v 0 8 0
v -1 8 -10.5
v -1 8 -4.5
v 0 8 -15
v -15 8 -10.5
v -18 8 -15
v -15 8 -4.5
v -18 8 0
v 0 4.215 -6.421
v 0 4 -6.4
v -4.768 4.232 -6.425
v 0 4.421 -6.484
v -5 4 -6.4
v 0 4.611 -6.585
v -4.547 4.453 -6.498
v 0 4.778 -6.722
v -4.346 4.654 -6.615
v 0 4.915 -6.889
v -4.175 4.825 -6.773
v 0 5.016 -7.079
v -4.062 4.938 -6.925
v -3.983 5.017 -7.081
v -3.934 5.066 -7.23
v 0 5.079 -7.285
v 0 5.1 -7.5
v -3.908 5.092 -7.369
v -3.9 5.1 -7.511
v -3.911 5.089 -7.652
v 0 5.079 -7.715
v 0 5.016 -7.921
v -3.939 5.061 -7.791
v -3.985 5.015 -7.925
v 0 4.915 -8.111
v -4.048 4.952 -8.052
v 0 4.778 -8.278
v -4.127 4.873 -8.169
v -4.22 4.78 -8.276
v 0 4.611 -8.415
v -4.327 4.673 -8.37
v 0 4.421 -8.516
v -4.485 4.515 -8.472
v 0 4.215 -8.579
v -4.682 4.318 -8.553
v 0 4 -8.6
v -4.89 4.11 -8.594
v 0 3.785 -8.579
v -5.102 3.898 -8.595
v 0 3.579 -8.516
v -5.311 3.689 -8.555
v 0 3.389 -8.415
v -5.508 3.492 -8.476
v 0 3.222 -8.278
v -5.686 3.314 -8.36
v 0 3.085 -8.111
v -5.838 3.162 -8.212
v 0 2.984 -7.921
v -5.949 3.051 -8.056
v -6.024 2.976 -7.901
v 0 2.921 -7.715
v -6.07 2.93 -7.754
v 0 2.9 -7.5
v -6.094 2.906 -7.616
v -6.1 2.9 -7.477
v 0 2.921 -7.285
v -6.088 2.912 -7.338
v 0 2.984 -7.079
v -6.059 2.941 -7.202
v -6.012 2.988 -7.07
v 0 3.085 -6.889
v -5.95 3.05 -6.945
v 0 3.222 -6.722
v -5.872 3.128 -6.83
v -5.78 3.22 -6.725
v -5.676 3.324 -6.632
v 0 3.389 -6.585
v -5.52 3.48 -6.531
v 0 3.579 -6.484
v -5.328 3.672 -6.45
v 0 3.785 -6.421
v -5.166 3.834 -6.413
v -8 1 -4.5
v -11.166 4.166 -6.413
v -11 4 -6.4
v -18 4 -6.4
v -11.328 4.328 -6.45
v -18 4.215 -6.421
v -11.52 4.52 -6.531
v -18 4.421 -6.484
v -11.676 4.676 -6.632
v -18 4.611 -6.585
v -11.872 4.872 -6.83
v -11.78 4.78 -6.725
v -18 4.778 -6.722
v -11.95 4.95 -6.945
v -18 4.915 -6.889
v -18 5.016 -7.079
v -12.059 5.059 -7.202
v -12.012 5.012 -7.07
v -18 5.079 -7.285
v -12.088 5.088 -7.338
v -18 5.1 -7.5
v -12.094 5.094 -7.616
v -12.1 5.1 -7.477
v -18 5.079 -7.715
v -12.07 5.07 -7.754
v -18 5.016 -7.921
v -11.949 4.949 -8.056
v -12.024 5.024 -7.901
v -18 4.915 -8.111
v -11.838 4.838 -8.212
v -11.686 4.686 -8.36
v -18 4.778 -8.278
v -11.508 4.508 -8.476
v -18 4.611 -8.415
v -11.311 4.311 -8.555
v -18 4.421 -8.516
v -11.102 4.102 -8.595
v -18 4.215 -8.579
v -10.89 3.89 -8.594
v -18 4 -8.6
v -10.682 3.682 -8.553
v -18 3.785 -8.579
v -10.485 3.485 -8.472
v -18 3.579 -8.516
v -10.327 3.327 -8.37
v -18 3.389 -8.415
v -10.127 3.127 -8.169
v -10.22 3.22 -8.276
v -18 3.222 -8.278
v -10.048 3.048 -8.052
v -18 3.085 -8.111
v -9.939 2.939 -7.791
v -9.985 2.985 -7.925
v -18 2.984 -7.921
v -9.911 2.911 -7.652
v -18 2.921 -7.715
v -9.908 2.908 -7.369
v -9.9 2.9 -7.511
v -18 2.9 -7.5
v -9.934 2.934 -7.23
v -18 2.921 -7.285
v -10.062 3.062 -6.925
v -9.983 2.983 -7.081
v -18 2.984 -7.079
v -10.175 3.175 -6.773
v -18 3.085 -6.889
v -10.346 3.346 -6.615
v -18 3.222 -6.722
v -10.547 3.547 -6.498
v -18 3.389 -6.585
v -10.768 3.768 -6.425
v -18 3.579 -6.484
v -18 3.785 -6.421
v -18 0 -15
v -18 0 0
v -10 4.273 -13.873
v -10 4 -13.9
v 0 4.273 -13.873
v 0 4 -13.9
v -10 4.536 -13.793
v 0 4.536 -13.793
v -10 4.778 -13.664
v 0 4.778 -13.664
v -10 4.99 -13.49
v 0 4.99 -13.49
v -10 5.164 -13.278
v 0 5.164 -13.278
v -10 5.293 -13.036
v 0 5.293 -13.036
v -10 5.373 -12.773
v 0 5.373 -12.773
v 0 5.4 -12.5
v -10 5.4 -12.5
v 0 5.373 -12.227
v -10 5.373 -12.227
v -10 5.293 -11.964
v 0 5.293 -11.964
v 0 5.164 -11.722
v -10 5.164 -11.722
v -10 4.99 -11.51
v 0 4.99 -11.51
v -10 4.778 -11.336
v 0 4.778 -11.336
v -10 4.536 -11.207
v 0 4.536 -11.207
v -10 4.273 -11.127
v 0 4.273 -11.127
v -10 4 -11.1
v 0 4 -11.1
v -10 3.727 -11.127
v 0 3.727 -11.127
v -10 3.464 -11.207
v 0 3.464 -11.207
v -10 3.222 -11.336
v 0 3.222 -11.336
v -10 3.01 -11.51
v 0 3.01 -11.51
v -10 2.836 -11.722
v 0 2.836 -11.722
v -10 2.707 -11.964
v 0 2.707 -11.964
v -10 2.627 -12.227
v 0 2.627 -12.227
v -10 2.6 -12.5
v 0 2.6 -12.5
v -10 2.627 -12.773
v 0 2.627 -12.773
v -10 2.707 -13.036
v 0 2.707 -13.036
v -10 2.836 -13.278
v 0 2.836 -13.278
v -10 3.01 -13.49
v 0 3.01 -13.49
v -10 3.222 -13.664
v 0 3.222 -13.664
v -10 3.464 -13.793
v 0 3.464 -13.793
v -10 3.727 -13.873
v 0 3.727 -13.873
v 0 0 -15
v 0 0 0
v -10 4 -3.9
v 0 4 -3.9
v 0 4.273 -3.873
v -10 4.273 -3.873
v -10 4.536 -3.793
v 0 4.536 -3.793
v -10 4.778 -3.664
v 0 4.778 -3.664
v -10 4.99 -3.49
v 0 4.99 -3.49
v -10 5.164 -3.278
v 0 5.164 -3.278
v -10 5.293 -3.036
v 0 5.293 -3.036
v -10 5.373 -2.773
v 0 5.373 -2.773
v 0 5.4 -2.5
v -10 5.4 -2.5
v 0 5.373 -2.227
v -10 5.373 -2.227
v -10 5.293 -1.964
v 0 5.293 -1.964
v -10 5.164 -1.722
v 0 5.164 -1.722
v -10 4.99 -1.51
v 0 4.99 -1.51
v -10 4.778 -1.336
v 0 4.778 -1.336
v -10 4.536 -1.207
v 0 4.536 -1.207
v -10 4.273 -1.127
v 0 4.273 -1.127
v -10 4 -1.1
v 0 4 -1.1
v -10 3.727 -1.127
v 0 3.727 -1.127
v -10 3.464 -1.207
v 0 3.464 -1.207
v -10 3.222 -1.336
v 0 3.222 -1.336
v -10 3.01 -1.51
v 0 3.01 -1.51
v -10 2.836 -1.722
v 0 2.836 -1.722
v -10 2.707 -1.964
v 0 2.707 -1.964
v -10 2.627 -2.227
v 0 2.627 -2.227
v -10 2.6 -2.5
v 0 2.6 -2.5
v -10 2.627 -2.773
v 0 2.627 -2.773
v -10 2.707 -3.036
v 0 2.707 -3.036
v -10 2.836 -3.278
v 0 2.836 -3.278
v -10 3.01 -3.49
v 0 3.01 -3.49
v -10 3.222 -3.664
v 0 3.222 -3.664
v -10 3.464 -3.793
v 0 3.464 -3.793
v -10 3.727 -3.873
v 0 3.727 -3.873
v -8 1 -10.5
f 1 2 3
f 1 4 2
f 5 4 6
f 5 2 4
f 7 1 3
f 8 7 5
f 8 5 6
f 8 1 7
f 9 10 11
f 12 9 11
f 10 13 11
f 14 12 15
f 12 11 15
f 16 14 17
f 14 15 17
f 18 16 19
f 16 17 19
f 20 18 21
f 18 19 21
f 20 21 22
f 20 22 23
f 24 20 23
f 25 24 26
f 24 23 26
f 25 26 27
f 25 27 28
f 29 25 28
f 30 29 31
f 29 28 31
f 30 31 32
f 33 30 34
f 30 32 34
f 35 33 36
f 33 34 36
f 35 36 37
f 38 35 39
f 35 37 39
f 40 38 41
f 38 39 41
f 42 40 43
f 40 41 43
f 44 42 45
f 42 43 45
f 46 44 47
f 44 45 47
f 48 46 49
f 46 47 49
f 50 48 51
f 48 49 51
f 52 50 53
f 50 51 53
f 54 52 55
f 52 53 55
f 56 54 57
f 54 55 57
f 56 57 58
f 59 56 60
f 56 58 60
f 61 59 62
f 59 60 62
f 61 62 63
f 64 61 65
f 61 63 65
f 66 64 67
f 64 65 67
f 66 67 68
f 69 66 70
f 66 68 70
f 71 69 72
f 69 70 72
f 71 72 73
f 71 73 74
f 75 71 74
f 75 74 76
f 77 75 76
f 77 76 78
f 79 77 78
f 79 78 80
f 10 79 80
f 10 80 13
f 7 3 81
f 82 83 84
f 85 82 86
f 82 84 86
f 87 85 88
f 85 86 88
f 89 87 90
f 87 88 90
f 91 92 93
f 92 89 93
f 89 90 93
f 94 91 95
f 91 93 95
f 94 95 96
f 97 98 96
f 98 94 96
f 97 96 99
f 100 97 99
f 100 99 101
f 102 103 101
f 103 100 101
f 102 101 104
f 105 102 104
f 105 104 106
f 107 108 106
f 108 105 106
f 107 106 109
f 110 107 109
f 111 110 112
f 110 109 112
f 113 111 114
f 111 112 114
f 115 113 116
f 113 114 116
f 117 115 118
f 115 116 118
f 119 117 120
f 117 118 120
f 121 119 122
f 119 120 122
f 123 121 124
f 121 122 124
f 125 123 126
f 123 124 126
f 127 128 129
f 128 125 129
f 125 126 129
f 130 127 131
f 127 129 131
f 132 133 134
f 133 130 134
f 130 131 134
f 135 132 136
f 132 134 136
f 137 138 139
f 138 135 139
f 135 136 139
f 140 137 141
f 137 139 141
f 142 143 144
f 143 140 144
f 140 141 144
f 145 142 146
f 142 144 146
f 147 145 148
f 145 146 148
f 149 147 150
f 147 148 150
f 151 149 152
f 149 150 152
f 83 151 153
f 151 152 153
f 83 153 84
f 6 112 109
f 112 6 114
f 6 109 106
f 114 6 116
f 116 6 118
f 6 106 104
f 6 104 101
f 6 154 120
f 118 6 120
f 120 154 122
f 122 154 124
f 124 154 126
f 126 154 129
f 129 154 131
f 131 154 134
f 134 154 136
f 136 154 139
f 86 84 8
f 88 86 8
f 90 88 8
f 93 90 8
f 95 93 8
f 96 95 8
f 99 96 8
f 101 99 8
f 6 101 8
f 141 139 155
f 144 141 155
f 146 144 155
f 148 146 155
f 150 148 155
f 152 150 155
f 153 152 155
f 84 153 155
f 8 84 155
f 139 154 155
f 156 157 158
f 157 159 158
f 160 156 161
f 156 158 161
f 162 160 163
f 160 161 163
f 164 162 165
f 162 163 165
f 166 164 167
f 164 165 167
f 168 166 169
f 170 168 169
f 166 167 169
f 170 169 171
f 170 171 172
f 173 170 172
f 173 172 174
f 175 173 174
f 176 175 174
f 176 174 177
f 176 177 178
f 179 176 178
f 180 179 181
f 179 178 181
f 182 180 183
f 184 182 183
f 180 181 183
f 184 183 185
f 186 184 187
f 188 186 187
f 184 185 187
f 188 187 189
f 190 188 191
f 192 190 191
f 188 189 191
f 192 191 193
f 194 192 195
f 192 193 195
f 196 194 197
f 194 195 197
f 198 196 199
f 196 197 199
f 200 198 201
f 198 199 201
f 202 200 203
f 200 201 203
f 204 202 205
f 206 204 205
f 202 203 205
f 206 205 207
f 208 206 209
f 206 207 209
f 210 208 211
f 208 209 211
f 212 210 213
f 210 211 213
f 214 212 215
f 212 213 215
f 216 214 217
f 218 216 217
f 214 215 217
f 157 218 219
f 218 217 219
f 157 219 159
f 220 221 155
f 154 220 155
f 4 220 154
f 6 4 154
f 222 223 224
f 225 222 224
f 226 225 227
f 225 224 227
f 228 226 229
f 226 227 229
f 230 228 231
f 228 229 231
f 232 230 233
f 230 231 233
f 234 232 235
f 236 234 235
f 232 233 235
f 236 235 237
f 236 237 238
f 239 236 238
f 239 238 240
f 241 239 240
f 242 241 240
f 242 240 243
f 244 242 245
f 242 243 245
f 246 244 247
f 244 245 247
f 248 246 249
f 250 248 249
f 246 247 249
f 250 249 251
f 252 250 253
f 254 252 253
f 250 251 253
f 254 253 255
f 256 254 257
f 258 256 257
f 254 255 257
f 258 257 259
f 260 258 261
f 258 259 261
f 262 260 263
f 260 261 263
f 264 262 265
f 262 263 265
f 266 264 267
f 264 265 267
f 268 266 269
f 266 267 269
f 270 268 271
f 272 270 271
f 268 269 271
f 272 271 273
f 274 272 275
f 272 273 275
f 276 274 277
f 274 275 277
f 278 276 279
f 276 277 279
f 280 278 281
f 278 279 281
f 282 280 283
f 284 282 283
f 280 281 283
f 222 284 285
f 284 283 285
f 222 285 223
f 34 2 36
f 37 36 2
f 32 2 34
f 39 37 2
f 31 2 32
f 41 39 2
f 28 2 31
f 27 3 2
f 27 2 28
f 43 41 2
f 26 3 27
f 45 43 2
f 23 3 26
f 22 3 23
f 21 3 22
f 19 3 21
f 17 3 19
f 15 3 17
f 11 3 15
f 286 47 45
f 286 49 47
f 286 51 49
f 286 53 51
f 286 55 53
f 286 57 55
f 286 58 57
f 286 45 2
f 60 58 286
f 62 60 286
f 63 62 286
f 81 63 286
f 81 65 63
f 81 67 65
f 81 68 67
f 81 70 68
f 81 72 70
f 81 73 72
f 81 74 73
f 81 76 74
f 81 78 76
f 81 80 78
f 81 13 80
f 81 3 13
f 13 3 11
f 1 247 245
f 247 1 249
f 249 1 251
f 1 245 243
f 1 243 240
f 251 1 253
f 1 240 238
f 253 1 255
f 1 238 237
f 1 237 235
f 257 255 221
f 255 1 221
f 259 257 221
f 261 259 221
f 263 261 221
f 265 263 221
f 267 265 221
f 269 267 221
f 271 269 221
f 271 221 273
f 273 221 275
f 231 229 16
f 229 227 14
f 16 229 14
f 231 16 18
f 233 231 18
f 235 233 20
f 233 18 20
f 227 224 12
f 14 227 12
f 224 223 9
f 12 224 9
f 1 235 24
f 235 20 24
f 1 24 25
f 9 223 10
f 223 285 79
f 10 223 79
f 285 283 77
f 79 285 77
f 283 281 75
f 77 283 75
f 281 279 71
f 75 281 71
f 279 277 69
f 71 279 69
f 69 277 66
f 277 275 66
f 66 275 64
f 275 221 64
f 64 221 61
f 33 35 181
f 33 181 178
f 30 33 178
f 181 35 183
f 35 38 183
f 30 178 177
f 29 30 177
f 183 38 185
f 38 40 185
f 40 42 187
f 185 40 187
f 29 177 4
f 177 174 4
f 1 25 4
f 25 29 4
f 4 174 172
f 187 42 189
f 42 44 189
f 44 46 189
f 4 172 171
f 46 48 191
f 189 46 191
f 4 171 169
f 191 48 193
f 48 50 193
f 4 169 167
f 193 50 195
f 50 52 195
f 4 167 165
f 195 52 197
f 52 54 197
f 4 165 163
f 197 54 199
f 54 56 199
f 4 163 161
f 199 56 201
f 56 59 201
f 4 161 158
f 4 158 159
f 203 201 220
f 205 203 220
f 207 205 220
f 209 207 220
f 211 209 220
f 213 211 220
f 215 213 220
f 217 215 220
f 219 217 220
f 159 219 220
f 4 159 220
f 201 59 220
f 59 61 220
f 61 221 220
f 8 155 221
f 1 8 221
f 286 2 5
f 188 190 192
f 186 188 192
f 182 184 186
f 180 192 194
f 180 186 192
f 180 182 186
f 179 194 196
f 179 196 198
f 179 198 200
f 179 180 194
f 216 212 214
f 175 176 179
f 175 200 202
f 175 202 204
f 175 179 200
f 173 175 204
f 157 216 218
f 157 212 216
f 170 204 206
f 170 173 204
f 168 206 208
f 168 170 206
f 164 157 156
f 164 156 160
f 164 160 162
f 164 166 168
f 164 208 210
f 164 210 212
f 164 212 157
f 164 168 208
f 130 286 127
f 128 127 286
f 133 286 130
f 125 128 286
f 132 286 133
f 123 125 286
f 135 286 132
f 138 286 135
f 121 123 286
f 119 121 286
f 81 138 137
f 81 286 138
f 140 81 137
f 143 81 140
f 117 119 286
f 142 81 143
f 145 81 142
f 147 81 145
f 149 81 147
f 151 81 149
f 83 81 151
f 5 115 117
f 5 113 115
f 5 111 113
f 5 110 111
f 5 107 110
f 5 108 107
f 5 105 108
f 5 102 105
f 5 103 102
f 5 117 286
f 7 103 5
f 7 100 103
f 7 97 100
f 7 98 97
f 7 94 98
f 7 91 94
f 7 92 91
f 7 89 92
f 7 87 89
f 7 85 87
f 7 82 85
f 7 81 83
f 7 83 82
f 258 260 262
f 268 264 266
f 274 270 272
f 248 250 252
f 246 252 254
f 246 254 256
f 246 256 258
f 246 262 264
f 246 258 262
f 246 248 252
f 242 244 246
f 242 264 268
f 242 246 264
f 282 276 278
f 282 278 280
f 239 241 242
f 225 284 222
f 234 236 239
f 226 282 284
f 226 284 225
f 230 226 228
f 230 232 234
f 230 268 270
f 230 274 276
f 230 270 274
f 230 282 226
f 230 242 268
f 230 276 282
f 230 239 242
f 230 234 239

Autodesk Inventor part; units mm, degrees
ref_plane "YZ Plane" through (0, 0, 0) normal (1, 0, 0) x (0, 1, 0)
ref_plane "XZ Plane" through (0, 0, 0) normal (0, 1, 0) x (-1, 0, 0)
sketch "Náčrt1" plane through (0, 0, 0) normal (0, 1, 0) x (-1, 0, 0)
  line L0 (0, 0) -> (0, -15)
  line L1 (0, -15) -> (18, -15)
  line L2 (18, -15) -> (18, 0)
  line L3 (18, 0) -> (0, 0)
  dimension "d0" = 15
  dimension "d1" = 18
extrude "Vysunutí1" add sketch "Náčrt1" along normal blind 8
sketch "Náčrt2" plane through (0, 0, 0) normal (1, 0, 0) x (0, 0, -1)
  line L0 (0, 0) -> (15, 0) projected
  line L1 (15, 0) -> (15, 8) projected
  line L2 (0, 8) -> (15, 8) projected
  line L3 (0, 0) -> (0, 8) projected
  circle A0 centre (12.5, 4) radius 1.4
  line L4 (15, 8) -> (0, 8) projected
  line L5 (7.5, 8) -> (7.5, 0) construction
  circle A1 centre (2.5, 4) radius 1.4
  point P0 (15, 4)
  dimension "d4" = 10
  dimension "d7" = 2.8
extrude "Vysunutí2" cut sketch "Náčrt2" against normal blind 10 contours A0 | A1
sketch "Náčrt3" plane through (-18, 0, -15) normal (-1, 0, 0) x (0, 0, 1)
  line L0 (0, 0) -> (15, 0) projected
  line L1 (15, 0) -> (15, 8) projected
  line L2 (0, 8) -> (15, 8) projected
  line L3 (0, 0) -> (0, 8) projected
  circle A0 centre (7.5, 4) radius 1.1
  point P0 (15, 0)
  dimension "d8" = 2.2
extrude "Vysunutí3" cut sketch "Náčrt3" against normal through all contours A0
ref_plane "Pracovní rovina1" through (0, 0, -7.5) normal (0, 0, -1) x (-1, 0, 0)
sketch "Náčrt4" plane through (0, 0, -7.5) normal (0, 0, -1) x (-1, 0, 0)
  line L0 (0, 0) -> (18, 0) projected
  line L1 (18, 0) -> (18, 8) projected
  line L2 (0, 8) -> (18, 8) projected
  line L3 (0, 0) -> (0, 8) projected
  line L4 (1, 8) -> (8, 1)
  line L5 (8, 1) -> (15, 8)
  point P0 (0, 0)
  dimension "d11" = 90
  dimension "d12" = 7
  dimension "d15" = 8
extrude "Vysunutí4" cut sketch "Náčrt4" along normal mid plane 6 contours L2 L5 L4
properties part number "uchyceni_pruziny"
